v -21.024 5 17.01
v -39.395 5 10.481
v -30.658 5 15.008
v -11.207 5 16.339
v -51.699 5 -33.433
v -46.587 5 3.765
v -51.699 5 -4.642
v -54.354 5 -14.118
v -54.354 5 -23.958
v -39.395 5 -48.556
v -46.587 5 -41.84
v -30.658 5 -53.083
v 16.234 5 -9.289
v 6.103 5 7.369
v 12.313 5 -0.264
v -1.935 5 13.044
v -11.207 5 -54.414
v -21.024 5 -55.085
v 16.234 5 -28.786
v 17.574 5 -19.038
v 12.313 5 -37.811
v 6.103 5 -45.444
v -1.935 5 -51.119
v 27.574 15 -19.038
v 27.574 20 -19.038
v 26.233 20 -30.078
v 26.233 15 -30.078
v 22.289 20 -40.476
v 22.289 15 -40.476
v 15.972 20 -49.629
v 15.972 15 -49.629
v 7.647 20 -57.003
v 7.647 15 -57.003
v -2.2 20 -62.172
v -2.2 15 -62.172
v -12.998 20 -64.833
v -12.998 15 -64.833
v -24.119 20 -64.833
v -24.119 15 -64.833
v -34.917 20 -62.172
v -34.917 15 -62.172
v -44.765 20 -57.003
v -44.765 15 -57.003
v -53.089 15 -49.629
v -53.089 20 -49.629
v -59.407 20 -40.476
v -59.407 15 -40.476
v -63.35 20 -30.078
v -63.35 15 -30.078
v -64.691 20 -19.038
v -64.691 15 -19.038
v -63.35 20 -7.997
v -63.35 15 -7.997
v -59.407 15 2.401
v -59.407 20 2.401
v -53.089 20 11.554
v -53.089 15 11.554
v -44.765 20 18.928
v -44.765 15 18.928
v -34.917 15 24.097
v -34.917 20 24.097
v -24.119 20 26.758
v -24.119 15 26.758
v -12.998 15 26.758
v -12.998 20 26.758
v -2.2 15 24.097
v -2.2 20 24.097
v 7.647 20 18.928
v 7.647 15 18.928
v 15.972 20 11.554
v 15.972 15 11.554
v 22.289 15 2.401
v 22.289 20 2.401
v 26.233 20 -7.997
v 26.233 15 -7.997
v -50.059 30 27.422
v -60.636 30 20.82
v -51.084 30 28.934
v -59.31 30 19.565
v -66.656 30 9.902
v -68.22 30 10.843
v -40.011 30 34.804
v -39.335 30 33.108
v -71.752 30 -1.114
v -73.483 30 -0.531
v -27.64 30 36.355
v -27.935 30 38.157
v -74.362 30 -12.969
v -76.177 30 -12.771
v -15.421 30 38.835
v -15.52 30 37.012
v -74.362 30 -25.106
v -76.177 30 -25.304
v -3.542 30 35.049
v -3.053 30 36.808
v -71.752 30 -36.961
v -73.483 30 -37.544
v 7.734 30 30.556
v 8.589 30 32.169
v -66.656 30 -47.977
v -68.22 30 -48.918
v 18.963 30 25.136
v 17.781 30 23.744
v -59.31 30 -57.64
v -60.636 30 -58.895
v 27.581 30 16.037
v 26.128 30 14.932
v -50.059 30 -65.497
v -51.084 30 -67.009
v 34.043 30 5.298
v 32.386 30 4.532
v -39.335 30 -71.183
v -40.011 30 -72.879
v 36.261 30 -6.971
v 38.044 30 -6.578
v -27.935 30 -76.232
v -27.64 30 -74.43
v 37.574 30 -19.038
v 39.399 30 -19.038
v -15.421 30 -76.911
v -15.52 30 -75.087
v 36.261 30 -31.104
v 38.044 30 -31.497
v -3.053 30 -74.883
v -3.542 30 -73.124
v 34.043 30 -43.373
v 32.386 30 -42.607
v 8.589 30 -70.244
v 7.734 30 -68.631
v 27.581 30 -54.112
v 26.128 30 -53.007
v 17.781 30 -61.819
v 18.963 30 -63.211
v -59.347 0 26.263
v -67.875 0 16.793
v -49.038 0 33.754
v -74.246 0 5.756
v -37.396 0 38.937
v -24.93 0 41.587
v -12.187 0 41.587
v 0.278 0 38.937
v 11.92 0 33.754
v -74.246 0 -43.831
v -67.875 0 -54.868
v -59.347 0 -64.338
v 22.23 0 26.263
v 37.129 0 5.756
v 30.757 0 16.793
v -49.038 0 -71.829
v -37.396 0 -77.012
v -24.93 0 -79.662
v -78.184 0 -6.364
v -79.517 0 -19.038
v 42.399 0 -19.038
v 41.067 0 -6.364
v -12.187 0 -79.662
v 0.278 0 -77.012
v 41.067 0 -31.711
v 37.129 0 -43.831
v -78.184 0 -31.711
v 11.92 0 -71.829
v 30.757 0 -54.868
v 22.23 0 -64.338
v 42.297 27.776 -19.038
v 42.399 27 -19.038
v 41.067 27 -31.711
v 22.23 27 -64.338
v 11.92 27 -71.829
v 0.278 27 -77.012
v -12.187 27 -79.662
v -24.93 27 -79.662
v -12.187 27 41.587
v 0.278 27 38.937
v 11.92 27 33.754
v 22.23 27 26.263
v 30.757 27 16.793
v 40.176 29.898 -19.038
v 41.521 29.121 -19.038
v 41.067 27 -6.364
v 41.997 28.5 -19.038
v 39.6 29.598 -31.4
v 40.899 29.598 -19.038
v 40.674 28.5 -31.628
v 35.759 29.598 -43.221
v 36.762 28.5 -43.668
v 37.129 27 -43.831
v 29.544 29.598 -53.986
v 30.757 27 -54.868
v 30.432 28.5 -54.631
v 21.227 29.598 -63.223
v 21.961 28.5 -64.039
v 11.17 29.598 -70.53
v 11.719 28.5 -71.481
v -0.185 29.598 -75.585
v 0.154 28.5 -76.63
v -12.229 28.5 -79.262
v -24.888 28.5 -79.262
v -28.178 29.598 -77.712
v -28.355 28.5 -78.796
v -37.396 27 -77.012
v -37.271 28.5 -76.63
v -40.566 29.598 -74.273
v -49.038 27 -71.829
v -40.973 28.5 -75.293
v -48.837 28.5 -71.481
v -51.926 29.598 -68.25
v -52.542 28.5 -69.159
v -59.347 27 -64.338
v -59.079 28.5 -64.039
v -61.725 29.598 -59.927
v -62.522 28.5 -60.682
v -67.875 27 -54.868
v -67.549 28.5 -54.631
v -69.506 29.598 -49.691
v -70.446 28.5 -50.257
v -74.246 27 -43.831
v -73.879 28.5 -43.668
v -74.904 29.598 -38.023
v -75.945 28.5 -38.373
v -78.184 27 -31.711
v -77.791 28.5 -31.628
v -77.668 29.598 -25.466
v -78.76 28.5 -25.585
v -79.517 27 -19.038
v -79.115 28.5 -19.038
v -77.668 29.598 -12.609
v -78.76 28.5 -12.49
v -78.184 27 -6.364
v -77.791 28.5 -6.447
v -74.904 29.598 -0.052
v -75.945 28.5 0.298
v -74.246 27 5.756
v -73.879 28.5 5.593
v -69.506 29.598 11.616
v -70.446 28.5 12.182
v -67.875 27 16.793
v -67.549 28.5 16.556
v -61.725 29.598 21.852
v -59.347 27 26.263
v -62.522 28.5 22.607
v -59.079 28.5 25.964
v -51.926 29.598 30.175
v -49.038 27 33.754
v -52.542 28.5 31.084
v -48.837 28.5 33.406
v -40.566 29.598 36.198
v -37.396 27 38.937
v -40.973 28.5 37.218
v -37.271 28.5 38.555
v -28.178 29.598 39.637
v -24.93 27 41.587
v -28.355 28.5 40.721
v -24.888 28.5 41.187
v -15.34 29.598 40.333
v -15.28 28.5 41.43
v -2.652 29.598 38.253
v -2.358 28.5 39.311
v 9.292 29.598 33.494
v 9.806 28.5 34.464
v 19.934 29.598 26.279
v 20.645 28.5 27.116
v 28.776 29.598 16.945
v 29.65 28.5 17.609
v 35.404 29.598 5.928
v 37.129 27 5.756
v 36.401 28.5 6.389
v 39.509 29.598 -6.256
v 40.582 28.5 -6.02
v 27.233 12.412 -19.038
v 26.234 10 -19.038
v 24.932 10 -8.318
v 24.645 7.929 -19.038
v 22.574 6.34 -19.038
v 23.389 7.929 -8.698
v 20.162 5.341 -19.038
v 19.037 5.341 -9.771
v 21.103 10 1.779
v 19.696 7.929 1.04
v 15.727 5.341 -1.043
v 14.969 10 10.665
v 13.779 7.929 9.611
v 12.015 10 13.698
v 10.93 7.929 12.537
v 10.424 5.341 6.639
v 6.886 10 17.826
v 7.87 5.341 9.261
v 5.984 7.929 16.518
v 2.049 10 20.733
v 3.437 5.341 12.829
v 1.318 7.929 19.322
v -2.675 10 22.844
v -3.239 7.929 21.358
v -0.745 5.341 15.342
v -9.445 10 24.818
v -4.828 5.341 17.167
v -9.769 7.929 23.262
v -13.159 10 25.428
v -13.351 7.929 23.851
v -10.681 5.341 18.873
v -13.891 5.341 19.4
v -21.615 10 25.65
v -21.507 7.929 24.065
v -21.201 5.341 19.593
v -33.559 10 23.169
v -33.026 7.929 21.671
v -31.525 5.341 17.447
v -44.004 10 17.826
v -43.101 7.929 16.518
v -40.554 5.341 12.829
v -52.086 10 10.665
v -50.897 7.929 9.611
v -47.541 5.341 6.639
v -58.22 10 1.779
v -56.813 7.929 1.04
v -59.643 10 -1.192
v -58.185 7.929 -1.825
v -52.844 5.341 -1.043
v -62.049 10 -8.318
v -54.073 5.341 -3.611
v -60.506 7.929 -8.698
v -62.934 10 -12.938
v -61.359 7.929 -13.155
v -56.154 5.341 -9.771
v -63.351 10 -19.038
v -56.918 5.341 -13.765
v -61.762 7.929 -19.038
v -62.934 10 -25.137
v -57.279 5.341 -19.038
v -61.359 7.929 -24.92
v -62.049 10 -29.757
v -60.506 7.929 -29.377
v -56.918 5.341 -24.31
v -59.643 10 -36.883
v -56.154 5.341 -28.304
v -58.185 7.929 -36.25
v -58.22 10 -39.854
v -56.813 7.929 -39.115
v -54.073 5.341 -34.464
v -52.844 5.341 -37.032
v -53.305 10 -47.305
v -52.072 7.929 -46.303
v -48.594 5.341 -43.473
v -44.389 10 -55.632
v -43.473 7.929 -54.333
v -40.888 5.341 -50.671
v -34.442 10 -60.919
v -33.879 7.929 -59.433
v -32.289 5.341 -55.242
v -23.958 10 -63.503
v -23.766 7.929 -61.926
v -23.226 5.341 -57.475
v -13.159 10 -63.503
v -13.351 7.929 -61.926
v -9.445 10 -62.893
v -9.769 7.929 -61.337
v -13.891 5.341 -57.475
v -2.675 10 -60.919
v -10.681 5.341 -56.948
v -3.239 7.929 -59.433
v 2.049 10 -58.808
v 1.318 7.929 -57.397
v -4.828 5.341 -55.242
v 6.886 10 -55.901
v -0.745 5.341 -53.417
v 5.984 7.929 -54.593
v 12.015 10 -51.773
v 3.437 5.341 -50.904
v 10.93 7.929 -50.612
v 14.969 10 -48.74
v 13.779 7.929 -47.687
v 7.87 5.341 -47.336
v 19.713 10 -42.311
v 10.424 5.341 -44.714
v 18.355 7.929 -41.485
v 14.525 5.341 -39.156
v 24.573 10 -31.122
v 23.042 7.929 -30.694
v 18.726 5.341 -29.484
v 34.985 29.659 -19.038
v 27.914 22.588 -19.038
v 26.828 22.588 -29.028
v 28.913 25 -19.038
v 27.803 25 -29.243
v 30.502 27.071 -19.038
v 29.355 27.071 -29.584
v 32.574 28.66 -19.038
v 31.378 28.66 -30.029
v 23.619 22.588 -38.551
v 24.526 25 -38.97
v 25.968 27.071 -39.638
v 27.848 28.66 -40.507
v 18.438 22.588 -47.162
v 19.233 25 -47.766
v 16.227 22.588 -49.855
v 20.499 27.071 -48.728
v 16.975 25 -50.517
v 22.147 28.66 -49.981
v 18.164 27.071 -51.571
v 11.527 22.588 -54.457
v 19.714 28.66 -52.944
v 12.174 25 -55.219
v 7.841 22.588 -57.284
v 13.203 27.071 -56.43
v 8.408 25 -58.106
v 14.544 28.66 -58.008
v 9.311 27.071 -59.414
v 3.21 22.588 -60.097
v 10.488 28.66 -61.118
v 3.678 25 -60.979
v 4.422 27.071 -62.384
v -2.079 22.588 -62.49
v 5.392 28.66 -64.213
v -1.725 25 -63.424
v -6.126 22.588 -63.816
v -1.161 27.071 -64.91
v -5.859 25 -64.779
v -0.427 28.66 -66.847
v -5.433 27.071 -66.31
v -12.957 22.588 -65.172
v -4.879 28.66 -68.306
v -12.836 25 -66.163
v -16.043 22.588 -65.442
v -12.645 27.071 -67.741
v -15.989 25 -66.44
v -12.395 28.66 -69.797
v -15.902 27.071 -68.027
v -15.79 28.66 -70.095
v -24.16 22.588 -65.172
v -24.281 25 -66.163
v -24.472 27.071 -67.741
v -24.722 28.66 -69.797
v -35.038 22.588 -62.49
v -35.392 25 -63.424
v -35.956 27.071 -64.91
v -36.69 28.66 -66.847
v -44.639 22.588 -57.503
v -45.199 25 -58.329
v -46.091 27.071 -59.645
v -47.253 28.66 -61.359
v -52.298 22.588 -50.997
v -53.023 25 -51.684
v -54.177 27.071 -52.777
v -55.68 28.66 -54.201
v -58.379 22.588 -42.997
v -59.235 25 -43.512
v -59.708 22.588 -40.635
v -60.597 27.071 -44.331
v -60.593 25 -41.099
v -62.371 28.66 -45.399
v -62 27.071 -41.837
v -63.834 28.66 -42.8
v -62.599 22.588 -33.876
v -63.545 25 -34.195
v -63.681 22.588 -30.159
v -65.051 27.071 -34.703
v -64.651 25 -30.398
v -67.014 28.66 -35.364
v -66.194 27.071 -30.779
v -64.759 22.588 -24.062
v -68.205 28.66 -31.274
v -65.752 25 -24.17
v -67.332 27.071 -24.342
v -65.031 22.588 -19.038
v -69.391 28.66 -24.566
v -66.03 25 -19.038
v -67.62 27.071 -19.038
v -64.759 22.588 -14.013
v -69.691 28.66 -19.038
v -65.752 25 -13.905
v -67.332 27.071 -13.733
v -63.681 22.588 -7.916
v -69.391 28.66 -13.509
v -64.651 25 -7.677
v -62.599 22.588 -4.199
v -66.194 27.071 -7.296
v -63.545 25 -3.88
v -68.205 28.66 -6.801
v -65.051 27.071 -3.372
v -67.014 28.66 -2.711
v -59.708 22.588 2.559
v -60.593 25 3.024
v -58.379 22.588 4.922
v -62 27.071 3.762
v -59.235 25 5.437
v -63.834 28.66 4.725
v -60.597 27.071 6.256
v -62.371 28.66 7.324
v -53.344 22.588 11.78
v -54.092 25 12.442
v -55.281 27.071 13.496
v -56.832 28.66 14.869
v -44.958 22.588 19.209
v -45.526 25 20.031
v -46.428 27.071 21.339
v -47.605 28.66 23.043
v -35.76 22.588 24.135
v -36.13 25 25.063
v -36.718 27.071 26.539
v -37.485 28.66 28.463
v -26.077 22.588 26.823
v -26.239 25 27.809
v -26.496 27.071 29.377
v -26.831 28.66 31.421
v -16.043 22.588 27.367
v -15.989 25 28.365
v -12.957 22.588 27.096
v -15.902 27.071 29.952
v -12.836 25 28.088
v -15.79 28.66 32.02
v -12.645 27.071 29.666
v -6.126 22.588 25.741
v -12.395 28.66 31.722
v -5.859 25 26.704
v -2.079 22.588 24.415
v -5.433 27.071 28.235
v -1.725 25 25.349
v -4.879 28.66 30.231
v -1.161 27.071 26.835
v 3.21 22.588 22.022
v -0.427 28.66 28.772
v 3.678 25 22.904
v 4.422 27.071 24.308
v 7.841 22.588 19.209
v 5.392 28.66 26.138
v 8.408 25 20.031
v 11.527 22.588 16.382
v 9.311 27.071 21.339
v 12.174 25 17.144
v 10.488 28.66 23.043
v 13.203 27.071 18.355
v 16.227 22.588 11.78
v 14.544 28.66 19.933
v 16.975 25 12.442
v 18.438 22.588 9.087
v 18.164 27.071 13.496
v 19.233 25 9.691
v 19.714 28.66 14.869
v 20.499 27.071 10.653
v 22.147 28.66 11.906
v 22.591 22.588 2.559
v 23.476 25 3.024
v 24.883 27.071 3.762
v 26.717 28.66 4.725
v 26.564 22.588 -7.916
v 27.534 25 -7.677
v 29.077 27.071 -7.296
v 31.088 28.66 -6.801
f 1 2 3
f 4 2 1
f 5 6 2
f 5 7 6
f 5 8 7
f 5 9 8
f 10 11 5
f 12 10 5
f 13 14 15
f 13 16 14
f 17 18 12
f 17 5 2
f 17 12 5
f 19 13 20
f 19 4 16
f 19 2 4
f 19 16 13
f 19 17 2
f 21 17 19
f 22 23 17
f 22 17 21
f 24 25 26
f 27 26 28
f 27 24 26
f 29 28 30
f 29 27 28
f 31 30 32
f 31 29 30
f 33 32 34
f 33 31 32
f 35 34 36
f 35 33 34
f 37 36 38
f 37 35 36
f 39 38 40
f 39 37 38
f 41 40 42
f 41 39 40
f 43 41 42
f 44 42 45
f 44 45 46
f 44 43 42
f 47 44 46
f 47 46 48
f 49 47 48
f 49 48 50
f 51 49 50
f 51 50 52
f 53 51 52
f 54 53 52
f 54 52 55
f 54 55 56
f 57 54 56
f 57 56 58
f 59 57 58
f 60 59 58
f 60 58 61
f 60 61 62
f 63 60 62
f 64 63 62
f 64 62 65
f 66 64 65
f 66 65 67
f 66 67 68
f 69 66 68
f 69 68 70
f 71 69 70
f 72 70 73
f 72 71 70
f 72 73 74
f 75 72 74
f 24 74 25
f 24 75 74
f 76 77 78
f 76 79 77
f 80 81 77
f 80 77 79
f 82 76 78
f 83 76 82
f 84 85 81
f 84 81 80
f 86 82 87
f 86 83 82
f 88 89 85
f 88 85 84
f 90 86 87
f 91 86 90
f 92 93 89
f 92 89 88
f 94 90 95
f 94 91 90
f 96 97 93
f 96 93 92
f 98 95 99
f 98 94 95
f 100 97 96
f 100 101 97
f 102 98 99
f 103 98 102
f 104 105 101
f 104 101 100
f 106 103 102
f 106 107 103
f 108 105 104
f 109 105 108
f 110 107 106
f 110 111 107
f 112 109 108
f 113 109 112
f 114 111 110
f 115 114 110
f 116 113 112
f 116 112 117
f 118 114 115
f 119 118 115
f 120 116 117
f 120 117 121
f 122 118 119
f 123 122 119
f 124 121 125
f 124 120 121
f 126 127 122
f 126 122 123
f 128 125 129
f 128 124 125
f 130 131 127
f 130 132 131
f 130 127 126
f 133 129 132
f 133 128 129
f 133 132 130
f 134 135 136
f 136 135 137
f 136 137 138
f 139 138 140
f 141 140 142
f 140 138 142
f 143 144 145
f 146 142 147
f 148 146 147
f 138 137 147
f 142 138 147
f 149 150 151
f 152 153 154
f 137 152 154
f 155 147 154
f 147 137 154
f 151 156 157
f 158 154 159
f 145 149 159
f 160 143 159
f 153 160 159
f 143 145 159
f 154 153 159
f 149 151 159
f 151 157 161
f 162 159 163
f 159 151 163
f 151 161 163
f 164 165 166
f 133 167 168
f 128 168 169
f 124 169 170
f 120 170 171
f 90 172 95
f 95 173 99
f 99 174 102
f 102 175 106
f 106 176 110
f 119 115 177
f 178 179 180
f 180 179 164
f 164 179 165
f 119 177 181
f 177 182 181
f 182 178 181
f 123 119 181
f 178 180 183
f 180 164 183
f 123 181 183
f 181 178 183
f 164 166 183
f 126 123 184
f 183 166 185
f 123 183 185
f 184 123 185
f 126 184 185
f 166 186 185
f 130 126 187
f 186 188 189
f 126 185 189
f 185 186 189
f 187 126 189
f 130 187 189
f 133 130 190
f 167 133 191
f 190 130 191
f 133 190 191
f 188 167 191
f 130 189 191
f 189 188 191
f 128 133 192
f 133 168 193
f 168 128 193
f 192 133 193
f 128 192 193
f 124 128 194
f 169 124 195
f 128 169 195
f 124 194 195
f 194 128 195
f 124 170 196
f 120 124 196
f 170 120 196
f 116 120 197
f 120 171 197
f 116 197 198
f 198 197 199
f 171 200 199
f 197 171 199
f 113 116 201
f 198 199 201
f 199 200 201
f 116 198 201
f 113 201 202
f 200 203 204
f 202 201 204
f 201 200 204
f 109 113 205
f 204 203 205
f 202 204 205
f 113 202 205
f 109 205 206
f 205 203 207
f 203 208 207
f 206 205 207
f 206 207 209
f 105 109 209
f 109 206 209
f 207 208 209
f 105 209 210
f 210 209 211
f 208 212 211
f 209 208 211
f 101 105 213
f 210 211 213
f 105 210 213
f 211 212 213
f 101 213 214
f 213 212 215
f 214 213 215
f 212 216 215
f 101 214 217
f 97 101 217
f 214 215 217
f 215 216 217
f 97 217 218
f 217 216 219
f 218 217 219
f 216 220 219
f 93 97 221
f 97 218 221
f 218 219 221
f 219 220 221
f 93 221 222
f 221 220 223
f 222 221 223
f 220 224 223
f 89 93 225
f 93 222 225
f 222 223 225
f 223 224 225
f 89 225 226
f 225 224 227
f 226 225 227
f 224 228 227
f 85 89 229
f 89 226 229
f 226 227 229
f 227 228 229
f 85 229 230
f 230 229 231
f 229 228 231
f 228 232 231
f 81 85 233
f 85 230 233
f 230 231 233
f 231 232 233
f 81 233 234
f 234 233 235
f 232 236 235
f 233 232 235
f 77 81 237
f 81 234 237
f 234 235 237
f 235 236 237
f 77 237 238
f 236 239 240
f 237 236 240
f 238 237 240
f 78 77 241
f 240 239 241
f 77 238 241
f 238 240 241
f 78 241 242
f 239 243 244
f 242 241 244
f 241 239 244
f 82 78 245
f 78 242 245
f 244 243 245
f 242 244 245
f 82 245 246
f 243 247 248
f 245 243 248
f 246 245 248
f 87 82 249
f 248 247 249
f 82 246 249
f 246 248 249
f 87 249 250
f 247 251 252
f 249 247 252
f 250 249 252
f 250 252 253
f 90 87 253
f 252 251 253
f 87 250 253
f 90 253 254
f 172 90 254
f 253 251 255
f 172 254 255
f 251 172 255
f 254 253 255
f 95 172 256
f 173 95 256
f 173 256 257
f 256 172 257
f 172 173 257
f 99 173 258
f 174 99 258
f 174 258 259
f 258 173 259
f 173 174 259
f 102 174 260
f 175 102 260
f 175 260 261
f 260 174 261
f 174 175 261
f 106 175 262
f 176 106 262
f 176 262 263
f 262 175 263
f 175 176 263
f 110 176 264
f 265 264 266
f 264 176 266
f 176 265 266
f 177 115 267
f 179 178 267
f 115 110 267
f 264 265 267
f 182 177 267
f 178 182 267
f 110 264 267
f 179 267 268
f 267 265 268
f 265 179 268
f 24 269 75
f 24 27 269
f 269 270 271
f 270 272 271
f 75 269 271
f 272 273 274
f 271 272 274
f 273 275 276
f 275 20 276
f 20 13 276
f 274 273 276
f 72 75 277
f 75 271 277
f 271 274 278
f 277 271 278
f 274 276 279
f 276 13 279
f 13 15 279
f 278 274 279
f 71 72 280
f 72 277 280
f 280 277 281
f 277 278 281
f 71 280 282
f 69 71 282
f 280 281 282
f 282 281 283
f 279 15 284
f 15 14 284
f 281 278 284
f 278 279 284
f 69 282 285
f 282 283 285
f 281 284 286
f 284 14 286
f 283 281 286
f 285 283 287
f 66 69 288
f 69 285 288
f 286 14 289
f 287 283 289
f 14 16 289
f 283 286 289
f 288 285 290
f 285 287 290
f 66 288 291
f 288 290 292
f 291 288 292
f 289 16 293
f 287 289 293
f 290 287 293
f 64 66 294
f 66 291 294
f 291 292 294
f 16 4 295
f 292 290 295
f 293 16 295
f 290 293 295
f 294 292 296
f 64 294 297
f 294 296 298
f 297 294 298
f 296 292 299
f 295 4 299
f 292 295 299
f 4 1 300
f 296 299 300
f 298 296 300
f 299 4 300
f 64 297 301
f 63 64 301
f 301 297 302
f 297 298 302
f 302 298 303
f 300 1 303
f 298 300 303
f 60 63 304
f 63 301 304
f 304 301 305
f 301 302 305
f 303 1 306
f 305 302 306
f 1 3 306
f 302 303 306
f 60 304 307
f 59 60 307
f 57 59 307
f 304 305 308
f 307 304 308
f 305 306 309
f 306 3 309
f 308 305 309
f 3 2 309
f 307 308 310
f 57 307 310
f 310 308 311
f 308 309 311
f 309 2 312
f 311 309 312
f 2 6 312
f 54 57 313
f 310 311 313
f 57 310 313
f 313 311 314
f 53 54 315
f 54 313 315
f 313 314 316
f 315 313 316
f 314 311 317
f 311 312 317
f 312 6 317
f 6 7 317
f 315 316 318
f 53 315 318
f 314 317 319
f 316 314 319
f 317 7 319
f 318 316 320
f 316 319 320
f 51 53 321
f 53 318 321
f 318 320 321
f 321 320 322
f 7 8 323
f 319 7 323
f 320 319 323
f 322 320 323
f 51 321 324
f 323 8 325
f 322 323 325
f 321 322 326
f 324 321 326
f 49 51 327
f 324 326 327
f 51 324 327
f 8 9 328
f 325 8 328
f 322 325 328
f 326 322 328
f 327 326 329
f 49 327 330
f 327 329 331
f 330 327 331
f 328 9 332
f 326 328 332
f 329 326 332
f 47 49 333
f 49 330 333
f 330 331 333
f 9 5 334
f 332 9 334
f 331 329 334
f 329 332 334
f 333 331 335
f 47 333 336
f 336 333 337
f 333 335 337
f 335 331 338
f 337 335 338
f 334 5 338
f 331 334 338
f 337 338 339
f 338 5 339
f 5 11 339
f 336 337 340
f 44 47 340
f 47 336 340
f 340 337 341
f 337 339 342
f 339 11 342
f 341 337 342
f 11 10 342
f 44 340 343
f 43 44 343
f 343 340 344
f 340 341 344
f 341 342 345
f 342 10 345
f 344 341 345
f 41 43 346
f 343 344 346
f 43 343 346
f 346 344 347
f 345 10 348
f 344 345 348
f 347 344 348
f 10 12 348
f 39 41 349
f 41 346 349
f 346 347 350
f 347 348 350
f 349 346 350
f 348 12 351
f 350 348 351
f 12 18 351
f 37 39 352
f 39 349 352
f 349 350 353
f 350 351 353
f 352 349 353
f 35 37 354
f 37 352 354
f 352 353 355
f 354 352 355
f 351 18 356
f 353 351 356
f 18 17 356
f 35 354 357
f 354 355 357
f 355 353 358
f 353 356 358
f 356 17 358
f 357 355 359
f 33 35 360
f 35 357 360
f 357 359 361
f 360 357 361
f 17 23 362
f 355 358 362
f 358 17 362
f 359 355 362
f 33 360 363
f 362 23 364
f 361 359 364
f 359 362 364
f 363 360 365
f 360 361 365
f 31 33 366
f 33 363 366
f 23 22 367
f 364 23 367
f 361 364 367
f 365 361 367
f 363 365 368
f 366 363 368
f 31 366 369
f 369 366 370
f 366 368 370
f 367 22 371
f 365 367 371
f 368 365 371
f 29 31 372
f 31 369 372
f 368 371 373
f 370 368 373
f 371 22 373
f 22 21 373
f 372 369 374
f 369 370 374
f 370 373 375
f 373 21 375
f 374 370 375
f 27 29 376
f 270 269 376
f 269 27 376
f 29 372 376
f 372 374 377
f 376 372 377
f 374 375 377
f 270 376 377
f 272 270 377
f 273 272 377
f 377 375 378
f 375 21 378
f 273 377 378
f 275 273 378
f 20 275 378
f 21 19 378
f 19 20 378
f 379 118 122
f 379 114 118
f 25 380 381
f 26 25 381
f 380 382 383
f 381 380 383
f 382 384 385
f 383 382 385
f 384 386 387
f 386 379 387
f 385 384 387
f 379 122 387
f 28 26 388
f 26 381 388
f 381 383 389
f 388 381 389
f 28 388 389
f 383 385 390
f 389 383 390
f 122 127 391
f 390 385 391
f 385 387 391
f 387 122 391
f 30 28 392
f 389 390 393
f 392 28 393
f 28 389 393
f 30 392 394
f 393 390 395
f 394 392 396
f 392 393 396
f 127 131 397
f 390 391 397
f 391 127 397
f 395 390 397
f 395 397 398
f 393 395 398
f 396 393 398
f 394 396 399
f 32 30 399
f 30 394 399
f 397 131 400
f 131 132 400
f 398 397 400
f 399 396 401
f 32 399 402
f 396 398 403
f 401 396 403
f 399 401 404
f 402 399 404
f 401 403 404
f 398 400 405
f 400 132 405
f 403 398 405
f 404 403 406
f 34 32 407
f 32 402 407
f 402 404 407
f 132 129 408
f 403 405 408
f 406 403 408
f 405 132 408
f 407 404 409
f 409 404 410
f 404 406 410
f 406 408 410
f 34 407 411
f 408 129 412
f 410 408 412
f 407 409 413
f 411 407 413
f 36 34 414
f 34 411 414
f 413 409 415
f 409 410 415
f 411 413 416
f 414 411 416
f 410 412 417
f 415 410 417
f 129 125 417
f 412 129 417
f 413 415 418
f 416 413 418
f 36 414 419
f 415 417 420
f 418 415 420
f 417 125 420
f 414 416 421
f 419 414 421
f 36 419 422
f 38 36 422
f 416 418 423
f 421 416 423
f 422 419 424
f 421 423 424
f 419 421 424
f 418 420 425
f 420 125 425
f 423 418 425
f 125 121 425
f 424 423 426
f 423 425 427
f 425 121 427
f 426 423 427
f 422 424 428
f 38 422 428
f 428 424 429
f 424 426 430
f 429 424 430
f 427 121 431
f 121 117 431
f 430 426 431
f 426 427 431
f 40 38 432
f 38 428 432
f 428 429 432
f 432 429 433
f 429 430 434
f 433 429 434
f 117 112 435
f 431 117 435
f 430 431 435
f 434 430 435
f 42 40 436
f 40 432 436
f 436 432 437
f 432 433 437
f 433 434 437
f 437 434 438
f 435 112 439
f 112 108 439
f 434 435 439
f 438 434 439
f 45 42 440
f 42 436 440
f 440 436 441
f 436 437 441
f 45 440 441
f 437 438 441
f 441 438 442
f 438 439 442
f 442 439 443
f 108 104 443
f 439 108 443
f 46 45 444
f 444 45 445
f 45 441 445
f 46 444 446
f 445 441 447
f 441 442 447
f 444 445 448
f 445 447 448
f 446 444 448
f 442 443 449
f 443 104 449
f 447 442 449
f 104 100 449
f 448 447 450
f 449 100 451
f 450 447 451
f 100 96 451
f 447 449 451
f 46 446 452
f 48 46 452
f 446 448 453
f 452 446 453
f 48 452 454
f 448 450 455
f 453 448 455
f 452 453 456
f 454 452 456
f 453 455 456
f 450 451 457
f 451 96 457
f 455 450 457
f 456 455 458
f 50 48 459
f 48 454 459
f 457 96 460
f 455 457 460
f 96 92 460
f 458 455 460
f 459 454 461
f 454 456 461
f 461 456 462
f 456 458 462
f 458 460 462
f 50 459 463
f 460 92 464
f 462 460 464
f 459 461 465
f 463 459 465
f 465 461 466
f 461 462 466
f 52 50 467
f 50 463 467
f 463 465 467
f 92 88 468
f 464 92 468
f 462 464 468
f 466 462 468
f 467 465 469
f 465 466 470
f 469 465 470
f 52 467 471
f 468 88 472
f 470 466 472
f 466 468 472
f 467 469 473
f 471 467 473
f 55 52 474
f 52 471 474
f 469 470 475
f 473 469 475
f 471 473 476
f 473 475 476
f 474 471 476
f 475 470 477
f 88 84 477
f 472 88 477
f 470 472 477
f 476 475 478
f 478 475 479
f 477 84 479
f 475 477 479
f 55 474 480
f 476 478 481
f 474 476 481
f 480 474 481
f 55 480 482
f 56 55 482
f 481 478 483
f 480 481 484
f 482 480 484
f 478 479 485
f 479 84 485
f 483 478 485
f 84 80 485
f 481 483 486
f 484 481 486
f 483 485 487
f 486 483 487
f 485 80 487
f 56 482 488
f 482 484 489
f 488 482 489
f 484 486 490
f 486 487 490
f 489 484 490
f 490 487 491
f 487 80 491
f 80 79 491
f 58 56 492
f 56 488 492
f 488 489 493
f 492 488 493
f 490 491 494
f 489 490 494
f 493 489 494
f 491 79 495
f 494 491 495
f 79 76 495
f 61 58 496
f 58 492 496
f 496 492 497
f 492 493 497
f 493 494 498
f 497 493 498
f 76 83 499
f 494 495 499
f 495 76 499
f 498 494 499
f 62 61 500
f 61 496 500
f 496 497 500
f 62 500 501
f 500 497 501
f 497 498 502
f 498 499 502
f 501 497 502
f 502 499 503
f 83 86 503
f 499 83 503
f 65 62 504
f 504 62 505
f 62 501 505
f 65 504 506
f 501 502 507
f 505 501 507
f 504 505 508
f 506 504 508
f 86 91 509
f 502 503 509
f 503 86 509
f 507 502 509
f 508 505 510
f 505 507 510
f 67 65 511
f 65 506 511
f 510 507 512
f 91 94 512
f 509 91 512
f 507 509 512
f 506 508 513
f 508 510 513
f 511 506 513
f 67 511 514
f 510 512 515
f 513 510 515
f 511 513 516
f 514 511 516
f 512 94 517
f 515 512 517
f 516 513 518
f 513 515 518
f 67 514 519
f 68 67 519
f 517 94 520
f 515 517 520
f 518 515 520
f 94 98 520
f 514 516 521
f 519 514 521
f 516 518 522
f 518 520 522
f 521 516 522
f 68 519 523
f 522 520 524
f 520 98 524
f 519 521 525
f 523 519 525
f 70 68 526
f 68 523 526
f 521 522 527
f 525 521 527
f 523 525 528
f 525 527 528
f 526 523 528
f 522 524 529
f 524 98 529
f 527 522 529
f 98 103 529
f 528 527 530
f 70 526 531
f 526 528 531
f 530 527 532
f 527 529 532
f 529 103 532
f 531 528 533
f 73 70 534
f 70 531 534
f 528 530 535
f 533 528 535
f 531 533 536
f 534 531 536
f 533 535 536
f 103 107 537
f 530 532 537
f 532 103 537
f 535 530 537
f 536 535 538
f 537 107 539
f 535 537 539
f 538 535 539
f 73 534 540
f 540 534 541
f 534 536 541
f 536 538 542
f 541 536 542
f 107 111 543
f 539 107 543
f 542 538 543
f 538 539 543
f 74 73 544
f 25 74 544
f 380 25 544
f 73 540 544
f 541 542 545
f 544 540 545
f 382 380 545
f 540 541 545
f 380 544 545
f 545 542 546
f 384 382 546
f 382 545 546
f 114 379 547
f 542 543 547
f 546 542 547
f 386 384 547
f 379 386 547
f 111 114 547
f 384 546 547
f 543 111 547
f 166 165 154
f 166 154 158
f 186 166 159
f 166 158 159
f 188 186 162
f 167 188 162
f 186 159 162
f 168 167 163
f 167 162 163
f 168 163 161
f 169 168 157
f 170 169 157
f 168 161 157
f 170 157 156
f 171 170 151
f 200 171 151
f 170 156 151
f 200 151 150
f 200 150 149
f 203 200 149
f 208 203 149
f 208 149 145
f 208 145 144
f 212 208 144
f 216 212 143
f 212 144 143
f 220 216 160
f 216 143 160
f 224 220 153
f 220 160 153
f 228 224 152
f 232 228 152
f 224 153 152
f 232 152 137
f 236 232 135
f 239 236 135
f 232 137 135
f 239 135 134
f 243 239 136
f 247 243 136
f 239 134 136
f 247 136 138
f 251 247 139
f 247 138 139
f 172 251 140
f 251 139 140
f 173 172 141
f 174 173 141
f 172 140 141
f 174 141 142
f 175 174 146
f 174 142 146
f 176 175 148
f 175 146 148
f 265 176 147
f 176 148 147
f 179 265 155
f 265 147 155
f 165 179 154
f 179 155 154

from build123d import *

# Parameters (mm, degrees)
SKETCH1_R           = 60.957989534
BOSS_EXTRUDE1_DEPTH = 5
SKETCH1_4_R         = 60.957989534
SKETCH1_4_R_2       = 46.132101341
BOSS_EXTRUDE2_DEPTH = 30
FILLET2_R           = 10
FILLET3_R           = 10
FILLET5_R           = 3


with BuildPart() as part:
    # Sketch1 → Boss-Extrude1 (new body)
    with BuildSketch(Plane(origin=(0, 0, 0), x_dir=(1, 0, 0), z_dir=(0, 1, 0))):
        with Locations((-18.5585839, 19.037515097)):
            Circle(SKETCH1_R)
    extrude(amount=BOSS_EXTRUDE1_DEPTH)

    # Sketch1<4> → Boss-Extrude2 (add)
    with BuildSketch(Plane(origin=(0, 0, 0), x_dir=(1, 0, 0), z_dir=(0, 1, 0))):
        with Locations((-18.5585839, 19.037515097)):
            Circle(SKETCH1_4_R)
        with Locations((-18.5585839, 19.037515097)):
            Circle(SKETCH1_4_R_2, mode=Mode.SUBTRACT)
    extrude(amount=BOSS_EXTRUDE2_DEPTH)

    # Fillet2
    fillet2_edges = [part.edges().sort_by_distance(p)[0] for p in [
        (-64.69068524, 5, -19.037515097),
    ]]
    fillet(fillet2_edges, radius=FILLET2_R)

    # Fillet3
    fillet3_edges = [part.edges().sort_by_distance(p)[0] for p in [
        (-64.69068524, 30, -19.037515097),
    ]]
    fillet(fillet3_edges, radius=FILLET3_R)

    # Fillet5
    fillet5_edges = [part.edges().sort_by_distance(p)[0] for p in [
        (-79.516573434, 30, -19.037515097),
    ]]
    fillet(fillet5_edges, radius=FILLET5_R)


solid = part.part
